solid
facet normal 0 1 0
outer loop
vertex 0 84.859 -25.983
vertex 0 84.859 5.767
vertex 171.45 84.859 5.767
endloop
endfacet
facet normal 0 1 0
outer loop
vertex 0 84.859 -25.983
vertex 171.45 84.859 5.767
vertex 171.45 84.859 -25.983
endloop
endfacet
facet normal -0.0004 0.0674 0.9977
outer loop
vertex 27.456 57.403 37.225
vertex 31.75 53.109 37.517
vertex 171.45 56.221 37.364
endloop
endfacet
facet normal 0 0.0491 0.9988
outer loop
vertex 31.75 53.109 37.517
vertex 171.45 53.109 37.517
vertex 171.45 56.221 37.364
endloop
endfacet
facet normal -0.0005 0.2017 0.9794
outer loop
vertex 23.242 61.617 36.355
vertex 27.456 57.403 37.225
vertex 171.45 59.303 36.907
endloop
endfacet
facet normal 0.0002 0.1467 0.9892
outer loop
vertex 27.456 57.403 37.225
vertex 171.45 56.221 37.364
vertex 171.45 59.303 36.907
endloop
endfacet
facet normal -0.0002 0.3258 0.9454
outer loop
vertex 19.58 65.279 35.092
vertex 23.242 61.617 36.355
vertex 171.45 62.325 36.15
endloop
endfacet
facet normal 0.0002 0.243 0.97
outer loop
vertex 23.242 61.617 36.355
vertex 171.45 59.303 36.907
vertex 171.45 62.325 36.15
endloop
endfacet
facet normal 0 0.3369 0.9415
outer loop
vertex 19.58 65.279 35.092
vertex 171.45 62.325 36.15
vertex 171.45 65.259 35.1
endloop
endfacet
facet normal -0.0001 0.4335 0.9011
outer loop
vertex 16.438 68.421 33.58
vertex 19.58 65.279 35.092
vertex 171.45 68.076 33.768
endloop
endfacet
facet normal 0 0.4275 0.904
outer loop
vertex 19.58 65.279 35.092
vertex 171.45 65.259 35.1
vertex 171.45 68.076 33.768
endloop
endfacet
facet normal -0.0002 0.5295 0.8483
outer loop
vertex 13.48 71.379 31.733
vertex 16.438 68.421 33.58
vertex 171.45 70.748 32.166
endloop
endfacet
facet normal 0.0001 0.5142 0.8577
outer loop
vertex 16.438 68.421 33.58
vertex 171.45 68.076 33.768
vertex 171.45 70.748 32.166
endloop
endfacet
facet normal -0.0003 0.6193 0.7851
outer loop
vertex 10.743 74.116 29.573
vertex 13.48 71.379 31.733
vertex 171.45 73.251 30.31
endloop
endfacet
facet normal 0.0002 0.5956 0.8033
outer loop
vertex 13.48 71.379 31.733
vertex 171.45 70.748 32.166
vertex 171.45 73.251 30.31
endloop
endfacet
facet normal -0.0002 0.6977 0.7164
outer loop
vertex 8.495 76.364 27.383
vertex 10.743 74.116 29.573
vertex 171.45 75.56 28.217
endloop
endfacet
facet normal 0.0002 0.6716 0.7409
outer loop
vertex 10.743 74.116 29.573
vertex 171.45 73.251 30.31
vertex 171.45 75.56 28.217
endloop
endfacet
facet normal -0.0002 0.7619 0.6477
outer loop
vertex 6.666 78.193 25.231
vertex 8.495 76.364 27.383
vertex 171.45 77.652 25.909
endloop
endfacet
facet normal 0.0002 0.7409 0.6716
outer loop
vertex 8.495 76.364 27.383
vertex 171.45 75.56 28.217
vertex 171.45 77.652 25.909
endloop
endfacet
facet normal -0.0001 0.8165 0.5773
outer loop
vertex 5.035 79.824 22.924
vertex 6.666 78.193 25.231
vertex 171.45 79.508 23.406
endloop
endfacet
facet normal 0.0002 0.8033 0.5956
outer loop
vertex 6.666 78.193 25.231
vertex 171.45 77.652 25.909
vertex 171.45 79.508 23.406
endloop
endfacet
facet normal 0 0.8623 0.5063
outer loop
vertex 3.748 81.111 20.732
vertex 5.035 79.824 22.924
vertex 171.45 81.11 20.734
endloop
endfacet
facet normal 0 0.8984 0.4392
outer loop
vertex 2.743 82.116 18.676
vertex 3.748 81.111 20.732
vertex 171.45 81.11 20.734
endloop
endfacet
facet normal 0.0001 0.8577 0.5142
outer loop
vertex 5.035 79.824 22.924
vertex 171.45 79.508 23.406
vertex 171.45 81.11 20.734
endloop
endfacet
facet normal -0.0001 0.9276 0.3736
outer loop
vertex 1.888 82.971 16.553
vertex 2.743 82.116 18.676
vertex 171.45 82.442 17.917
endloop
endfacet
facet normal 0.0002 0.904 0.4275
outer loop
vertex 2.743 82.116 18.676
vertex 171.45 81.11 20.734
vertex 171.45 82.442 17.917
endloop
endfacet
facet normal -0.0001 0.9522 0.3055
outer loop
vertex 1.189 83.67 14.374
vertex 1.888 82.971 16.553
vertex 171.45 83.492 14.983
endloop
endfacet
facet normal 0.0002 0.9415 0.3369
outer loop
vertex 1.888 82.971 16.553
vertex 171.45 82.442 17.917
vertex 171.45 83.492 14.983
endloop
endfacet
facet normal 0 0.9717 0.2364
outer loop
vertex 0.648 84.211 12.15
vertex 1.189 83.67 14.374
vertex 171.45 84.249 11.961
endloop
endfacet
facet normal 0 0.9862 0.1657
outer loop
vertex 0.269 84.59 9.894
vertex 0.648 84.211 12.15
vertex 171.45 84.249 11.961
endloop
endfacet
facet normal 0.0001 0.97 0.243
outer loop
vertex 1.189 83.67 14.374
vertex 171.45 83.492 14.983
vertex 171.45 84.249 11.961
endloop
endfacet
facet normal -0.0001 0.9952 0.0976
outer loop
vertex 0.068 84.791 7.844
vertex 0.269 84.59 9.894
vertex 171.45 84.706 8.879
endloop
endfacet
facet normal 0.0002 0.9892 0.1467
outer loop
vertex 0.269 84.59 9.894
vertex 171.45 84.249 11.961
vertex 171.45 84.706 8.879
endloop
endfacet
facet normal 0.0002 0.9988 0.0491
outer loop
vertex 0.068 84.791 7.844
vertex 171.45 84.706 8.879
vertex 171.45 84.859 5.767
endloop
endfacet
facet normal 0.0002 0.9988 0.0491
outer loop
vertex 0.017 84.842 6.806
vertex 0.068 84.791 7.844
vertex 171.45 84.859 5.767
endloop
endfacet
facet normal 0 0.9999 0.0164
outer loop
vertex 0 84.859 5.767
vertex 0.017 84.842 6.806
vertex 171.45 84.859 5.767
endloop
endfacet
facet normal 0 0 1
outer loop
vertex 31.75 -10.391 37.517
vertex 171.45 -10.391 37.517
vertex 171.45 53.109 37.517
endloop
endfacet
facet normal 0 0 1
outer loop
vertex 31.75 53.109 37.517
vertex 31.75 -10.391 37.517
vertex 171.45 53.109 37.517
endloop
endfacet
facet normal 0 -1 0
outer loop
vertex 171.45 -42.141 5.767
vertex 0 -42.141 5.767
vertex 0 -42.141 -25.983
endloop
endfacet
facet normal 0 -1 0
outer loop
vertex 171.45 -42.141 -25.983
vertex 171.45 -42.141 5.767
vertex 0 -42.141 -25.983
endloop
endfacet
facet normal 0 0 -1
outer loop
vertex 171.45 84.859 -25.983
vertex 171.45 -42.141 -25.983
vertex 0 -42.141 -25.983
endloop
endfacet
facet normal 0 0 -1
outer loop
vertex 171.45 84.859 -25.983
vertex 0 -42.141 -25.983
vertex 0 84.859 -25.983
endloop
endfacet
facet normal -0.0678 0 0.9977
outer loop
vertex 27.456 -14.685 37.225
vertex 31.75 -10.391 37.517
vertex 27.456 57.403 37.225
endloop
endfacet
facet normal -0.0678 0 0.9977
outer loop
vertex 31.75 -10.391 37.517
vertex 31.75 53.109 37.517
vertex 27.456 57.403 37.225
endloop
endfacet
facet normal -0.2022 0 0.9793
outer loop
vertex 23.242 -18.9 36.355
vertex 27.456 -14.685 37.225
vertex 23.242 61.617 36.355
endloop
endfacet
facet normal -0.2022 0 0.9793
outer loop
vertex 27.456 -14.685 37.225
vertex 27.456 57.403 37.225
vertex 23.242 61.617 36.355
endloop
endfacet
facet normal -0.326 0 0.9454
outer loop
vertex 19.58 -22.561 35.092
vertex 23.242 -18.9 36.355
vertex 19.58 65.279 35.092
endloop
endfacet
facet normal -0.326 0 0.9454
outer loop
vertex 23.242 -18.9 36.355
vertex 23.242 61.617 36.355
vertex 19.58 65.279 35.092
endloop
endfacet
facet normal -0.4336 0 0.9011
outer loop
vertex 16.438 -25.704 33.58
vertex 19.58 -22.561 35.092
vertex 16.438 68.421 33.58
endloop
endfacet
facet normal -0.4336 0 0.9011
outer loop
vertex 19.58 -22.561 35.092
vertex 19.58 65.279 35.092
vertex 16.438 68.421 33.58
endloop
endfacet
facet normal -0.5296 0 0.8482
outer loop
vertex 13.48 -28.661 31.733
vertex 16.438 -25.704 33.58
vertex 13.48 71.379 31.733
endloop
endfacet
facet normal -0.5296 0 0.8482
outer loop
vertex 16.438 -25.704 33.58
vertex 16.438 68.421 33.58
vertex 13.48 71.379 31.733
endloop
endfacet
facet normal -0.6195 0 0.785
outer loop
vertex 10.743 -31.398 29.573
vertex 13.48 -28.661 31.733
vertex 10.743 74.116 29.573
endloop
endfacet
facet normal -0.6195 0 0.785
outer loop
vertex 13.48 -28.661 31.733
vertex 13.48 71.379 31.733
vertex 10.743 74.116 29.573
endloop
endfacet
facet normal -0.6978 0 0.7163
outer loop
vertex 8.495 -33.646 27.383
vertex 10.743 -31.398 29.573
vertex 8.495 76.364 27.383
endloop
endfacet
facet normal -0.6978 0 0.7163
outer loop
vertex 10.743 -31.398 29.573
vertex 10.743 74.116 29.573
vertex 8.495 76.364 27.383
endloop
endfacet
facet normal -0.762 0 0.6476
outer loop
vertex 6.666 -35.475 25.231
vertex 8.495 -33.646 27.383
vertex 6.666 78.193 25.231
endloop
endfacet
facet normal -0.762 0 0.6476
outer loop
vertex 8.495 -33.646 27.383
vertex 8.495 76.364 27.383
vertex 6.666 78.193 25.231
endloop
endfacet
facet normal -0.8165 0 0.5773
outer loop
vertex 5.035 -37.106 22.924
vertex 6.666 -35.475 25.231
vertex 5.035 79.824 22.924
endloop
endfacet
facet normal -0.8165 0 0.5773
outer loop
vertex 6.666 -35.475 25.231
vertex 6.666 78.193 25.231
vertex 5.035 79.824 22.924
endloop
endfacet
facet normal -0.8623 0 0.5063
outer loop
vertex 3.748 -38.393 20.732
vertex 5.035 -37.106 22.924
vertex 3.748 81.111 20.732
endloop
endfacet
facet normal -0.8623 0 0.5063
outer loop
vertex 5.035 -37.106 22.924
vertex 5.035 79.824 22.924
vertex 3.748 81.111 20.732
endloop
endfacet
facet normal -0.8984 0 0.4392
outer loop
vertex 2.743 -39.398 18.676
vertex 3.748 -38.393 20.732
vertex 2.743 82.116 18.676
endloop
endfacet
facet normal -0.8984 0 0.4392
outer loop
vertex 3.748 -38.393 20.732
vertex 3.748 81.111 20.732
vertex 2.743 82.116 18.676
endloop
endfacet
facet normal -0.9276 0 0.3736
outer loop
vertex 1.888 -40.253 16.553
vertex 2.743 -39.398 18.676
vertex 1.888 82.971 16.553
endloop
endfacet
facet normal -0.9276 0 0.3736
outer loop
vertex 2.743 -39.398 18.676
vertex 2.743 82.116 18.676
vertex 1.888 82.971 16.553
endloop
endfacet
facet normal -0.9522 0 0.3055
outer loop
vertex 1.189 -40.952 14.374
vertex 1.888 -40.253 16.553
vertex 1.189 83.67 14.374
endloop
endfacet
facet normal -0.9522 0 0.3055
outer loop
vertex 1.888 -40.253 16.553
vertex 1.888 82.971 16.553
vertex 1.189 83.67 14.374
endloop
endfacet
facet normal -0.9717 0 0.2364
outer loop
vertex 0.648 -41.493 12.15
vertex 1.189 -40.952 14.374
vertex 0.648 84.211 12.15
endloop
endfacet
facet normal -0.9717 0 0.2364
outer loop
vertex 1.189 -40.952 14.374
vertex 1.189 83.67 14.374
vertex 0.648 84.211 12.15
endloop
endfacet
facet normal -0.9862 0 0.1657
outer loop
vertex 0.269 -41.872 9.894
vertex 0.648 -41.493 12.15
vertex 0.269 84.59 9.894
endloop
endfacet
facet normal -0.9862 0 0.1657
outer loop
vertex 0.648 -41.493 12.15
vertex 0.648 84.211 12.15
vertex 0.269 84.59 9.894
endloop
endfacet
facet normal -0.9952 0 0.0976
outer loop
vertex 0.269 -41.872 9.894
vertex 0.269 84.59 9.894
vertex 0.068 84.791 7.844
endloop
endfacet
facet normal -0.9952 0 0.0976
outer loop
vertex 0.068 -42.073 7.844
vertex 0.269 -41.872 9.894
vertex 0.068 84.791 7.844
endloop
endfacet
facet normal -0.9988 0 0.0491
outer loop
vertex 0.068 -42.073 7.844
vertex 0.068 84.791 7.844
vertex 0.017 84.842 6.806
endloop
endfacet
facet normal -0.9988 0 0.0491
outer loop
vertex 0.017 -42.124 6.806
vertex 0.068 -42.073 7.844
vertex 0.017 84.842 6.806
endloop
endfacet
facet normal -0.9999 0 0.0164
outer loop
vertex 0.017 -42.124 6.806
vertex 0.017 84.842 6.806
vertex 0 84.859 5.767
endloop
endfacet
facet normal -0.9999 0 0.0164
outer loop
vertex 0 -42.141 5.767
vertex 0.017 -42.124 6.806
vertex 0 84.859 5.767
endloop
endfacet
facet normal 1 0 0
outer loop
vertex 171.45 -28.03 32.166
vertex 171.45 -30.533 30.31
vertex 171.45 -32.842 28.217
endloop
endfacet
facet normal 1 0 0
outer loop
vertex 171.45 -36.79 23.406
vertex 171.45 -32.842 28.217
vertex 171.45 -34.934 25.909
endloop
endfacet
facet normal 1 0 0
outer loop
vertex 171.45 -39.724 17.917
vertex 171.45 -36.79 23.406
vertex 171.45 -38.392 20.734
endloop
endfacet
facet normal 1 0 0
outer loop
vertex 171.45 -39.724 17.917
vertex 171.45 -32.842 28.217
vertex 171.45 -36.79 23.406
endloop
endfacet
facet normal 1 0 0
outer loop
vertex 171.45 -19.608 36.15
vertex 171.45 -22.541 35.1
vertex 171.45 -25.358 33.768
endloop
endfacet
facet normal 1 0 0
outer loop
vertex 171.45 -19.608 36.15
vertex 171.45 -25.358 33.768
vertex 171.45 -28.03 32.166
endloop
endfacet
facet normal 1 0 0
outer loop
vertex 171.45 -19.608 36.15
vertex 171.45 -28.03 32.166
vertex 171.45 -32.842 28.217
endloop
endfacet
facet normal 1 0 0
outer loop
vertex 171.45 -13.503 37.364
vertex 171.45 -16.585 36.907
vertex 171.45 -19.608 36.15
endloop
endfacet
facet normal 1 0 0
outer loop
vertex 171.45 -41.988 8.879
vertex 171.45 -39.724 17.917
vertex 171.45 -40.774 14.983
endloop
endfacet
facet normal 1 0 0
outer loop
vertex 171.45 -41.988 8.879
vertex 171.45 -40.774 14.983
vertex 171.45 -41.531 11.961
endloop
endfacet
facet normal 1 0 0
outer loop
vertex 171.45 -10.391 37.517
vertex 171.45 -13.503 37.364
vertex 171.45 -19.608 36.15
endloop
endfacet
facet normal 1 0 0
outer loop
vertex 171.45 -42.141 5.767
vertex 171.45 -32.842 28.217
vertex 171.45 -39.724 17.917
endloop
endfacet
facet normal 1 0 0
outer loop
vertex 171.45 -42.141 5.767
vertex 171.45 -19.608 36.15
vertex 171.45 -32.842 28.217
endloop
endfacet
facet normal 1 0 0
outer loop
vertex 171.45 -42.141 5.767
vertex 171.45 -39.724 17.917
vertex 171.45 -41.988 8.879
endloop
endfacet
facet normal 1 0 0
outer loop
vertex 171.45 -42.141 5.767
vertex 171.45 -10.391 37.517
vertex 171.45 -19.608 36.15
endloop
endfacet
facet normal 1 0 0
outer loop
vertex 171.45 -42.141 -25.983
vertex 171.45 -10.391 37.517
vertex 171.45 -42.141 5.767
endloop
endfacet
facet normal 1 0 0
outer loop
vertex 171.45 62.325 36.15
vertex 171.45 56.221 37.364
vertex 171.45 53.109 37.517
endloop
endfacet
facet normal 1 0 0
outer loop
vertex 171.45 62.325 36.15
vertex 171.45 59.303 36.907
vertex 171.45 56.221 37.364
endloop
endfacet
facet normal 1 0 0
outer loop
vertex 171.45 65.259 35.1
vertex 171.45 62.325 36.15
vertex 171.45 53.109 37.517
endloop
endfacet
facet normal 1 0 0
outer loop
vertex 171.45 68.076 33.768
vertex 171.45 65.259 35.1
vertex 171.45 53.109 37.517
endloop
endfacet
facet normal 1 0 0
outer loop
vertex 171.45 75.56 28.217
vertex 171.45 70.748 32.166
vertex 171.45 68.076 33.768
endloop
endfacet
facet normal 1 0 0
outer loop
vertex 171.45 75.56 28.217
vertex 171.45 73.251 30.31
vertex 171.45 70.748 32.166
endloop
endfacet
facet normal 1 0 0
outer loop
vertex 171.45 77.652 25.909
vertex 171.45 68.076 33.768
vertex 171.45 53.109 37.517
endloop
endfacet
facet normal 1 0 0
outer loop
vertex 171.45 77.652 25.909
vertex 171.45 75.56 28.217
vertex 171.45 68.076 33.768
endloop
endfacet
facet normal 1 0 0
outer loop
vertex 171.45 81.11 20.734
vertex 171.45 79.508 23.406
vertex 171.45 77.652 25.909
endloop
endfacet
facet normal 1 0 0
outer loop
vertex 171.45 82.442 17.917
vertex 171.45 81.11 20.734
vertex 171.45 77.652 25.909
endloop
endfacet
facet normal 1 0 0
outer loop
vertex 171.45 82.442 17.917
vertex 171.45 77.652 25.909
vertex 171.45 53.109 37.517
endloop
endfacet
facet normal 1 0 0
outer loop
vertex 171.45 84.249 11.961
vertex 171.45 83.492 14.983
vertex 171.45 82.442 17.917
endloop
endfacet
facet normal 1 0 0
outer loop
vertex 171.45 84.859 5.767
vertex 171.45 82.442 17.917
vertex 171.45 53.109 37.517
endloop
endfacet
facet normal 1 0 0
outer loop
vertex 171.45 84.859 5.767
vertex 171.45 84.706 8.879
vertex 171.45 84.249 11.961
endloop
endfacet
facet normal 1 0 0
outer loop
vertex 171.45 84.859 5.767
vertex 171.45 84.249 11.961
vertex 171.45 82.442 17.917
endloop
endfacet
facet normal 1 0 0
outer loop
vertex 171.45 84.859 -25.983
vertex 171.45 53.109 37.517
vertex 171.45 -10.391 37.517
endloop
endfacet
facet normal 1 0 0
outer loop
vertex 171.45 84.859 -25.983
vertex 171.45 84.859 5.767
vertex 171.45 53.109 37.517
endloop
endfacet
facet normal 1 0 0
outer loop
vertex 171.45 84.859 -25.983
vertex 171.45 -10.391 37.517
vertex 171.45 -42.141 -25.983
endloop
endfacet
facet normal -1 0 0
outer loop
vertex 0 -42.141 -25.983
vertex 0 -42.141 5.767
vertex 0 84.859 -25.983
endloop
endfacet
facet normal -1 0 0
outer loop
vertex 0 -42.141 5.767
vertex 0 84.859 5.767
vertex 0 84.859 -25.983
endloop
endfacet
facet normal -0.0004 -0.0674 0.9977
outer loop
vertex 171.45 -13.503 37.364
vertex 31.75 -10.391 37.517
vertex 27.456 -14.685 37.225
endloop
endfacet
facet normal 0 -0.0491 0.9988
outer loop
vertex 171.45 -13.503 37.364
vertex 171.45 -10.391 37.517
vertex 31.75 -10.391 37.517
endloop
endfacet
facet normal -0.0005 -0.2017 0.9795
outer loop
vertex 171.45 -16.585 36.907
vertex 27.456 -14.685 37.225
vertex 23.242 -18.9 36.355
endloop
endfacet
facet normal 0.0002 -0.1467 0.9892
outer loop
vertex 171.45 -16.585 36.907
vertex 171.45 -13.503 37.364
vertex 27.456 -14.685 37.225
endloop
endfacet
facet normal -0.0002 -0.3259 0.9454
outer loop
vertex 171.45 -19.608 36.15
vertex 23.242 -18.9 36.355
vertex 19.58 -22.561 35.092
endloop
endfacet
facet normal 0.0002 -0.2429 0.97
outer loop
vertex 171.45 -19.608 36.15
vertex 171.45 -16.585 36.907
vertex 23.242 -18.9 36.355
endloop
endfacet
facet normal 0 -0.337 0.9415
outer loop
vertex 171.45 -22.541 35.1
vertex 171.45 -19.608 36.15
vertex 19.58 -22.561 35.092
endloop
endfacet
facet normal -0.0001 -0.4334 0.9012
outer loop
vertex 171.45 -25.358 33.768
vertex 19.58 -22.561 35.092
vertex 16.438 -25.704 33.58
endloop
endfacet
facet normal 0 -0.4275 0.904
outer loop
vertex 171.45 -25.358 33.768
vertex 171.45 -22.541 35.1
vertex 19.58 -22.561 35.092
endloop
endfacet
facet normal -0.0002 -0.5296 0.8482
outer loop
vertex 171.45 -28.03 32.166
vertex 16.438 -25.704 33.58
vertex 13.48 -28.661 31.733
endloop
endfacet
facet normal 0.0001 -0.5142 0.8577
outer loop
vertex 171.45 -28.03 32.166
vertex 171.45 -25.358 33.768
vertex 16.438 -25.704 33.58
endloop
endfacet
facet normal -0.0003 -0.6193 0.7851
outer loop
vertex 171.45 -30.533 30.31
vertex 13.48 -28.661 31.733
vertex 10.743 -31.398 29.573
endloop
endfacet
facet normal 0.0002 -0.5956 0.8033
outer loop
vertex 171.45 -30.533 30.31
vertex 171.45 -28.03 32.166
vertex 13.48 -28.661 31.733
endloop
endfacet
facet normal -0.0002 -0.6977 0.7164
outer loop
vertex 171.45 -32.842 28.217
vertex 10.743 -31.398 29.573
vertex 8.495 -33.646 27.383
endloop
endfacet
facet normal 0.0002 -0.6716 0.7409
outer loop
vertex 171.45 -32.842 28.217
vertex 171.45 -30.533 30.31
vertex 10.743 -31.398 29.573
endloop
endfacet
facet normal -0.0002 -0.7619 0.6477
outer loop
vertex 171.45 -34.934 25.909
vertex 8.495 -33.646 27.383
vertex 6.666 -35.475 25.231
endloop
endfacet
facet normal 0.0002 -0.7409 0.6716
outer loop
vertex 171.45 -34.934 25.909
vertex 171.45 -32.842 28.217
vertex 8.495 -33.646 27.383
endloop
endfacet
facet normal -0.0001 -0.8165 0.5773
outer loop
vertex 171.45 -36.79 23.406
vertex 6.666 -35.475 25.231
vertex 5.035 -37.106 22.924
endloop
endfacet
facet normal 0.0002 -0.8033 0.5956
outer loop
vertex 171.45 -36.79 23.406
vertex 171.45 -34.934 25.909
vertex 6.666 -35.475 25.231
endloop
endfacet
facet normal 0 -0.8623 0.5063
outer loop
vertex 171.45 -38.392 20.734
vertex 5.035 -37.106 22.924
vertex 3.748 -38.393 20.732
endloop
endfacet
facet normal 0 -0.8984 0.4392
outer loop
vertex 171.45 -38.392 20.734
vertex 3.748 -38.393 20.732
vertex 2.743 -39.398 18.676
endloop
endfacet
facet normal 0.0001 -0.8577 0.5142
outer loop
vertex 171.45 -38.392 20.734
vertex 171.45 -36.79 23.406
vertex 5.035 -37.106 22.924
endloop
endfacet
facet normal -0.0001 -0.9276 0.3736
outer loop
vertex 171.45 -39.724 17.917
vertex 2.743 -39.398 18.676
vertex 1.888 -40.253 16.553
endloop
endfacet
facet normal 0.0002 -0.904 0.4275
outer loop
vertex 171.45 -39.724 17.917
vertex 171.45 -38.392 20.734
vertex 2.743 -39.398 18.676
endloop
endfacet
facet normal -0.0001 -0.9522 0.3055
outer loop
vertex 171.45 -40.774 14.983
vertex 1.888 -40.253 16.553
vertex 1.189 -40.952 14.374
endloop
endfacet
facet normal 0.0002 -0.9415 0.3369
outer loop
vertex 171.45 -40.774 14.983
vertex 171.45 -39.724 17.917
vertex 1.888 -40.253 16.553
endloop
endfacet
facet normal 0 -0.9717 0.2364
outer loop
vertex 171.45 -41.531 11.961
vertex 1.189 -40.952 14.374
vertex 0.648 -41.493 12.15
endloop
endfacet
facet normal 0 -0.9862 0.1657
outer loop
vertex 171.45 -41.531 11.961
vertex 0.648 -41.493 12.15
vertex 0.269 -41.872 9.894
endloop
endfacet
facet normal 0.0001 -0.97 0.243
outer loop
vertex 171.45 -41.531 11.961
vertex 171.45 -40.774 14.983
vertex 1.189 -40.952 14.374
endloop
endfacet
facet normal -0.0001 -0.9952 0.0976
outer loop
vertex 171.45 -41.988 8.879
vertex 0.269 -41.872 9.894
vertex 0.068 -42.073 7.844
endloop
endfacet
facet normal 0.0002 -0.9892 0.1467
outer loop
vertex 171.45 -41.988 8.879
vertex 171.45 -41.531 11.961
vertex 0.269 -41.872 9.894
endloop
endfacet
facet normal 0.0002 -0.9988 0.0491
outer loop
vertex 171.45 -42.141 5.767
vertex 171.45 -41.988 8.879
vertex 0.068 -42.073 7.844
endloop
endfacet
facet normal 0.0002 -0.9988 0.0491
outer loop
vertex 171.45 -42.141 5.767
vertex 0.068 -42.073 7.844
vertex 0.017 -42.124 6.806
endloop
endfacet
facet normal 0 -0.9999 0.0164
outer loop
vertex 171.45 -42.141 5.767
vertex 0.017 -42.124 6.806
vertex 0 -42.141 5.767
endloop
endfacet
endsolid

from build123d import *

# Parameters (mm, degrees)
SKETCH1_W           = 63.5
SKETCH1_H           = 127
BOSS_EXTRUDE1_DEPTH = 171.45
FILLET1_R           = 31.75


with BuildPart() as part:
    # Sketch1 → Boss-Extrude1 (new body)
    with BuildSketch(Plane(origin=(0, 0, 0), x_dir=(0, 0, -1), z_dir=(1, 0, 0))):
        with Locations((-5.766791516, 21.358919545)):
            Rectangle(SKETCH1_W, SKETCH1_H)
    extrude(amount=BOSS_EXTRUDE1_DEPTH)

    # Fillet1
    fillet1_edges = [part.edges().sort_by_distance(p)[0] for p in [
        (0, 21.358919545, 37.516791516),
        (85.725, 84.858919545, 37.516791516),
        (85.725, -42.141080455, 37.516791516),
    ]]
    fillet(fillet1_edges, radius=FILLET1_R)


solid = part.part
